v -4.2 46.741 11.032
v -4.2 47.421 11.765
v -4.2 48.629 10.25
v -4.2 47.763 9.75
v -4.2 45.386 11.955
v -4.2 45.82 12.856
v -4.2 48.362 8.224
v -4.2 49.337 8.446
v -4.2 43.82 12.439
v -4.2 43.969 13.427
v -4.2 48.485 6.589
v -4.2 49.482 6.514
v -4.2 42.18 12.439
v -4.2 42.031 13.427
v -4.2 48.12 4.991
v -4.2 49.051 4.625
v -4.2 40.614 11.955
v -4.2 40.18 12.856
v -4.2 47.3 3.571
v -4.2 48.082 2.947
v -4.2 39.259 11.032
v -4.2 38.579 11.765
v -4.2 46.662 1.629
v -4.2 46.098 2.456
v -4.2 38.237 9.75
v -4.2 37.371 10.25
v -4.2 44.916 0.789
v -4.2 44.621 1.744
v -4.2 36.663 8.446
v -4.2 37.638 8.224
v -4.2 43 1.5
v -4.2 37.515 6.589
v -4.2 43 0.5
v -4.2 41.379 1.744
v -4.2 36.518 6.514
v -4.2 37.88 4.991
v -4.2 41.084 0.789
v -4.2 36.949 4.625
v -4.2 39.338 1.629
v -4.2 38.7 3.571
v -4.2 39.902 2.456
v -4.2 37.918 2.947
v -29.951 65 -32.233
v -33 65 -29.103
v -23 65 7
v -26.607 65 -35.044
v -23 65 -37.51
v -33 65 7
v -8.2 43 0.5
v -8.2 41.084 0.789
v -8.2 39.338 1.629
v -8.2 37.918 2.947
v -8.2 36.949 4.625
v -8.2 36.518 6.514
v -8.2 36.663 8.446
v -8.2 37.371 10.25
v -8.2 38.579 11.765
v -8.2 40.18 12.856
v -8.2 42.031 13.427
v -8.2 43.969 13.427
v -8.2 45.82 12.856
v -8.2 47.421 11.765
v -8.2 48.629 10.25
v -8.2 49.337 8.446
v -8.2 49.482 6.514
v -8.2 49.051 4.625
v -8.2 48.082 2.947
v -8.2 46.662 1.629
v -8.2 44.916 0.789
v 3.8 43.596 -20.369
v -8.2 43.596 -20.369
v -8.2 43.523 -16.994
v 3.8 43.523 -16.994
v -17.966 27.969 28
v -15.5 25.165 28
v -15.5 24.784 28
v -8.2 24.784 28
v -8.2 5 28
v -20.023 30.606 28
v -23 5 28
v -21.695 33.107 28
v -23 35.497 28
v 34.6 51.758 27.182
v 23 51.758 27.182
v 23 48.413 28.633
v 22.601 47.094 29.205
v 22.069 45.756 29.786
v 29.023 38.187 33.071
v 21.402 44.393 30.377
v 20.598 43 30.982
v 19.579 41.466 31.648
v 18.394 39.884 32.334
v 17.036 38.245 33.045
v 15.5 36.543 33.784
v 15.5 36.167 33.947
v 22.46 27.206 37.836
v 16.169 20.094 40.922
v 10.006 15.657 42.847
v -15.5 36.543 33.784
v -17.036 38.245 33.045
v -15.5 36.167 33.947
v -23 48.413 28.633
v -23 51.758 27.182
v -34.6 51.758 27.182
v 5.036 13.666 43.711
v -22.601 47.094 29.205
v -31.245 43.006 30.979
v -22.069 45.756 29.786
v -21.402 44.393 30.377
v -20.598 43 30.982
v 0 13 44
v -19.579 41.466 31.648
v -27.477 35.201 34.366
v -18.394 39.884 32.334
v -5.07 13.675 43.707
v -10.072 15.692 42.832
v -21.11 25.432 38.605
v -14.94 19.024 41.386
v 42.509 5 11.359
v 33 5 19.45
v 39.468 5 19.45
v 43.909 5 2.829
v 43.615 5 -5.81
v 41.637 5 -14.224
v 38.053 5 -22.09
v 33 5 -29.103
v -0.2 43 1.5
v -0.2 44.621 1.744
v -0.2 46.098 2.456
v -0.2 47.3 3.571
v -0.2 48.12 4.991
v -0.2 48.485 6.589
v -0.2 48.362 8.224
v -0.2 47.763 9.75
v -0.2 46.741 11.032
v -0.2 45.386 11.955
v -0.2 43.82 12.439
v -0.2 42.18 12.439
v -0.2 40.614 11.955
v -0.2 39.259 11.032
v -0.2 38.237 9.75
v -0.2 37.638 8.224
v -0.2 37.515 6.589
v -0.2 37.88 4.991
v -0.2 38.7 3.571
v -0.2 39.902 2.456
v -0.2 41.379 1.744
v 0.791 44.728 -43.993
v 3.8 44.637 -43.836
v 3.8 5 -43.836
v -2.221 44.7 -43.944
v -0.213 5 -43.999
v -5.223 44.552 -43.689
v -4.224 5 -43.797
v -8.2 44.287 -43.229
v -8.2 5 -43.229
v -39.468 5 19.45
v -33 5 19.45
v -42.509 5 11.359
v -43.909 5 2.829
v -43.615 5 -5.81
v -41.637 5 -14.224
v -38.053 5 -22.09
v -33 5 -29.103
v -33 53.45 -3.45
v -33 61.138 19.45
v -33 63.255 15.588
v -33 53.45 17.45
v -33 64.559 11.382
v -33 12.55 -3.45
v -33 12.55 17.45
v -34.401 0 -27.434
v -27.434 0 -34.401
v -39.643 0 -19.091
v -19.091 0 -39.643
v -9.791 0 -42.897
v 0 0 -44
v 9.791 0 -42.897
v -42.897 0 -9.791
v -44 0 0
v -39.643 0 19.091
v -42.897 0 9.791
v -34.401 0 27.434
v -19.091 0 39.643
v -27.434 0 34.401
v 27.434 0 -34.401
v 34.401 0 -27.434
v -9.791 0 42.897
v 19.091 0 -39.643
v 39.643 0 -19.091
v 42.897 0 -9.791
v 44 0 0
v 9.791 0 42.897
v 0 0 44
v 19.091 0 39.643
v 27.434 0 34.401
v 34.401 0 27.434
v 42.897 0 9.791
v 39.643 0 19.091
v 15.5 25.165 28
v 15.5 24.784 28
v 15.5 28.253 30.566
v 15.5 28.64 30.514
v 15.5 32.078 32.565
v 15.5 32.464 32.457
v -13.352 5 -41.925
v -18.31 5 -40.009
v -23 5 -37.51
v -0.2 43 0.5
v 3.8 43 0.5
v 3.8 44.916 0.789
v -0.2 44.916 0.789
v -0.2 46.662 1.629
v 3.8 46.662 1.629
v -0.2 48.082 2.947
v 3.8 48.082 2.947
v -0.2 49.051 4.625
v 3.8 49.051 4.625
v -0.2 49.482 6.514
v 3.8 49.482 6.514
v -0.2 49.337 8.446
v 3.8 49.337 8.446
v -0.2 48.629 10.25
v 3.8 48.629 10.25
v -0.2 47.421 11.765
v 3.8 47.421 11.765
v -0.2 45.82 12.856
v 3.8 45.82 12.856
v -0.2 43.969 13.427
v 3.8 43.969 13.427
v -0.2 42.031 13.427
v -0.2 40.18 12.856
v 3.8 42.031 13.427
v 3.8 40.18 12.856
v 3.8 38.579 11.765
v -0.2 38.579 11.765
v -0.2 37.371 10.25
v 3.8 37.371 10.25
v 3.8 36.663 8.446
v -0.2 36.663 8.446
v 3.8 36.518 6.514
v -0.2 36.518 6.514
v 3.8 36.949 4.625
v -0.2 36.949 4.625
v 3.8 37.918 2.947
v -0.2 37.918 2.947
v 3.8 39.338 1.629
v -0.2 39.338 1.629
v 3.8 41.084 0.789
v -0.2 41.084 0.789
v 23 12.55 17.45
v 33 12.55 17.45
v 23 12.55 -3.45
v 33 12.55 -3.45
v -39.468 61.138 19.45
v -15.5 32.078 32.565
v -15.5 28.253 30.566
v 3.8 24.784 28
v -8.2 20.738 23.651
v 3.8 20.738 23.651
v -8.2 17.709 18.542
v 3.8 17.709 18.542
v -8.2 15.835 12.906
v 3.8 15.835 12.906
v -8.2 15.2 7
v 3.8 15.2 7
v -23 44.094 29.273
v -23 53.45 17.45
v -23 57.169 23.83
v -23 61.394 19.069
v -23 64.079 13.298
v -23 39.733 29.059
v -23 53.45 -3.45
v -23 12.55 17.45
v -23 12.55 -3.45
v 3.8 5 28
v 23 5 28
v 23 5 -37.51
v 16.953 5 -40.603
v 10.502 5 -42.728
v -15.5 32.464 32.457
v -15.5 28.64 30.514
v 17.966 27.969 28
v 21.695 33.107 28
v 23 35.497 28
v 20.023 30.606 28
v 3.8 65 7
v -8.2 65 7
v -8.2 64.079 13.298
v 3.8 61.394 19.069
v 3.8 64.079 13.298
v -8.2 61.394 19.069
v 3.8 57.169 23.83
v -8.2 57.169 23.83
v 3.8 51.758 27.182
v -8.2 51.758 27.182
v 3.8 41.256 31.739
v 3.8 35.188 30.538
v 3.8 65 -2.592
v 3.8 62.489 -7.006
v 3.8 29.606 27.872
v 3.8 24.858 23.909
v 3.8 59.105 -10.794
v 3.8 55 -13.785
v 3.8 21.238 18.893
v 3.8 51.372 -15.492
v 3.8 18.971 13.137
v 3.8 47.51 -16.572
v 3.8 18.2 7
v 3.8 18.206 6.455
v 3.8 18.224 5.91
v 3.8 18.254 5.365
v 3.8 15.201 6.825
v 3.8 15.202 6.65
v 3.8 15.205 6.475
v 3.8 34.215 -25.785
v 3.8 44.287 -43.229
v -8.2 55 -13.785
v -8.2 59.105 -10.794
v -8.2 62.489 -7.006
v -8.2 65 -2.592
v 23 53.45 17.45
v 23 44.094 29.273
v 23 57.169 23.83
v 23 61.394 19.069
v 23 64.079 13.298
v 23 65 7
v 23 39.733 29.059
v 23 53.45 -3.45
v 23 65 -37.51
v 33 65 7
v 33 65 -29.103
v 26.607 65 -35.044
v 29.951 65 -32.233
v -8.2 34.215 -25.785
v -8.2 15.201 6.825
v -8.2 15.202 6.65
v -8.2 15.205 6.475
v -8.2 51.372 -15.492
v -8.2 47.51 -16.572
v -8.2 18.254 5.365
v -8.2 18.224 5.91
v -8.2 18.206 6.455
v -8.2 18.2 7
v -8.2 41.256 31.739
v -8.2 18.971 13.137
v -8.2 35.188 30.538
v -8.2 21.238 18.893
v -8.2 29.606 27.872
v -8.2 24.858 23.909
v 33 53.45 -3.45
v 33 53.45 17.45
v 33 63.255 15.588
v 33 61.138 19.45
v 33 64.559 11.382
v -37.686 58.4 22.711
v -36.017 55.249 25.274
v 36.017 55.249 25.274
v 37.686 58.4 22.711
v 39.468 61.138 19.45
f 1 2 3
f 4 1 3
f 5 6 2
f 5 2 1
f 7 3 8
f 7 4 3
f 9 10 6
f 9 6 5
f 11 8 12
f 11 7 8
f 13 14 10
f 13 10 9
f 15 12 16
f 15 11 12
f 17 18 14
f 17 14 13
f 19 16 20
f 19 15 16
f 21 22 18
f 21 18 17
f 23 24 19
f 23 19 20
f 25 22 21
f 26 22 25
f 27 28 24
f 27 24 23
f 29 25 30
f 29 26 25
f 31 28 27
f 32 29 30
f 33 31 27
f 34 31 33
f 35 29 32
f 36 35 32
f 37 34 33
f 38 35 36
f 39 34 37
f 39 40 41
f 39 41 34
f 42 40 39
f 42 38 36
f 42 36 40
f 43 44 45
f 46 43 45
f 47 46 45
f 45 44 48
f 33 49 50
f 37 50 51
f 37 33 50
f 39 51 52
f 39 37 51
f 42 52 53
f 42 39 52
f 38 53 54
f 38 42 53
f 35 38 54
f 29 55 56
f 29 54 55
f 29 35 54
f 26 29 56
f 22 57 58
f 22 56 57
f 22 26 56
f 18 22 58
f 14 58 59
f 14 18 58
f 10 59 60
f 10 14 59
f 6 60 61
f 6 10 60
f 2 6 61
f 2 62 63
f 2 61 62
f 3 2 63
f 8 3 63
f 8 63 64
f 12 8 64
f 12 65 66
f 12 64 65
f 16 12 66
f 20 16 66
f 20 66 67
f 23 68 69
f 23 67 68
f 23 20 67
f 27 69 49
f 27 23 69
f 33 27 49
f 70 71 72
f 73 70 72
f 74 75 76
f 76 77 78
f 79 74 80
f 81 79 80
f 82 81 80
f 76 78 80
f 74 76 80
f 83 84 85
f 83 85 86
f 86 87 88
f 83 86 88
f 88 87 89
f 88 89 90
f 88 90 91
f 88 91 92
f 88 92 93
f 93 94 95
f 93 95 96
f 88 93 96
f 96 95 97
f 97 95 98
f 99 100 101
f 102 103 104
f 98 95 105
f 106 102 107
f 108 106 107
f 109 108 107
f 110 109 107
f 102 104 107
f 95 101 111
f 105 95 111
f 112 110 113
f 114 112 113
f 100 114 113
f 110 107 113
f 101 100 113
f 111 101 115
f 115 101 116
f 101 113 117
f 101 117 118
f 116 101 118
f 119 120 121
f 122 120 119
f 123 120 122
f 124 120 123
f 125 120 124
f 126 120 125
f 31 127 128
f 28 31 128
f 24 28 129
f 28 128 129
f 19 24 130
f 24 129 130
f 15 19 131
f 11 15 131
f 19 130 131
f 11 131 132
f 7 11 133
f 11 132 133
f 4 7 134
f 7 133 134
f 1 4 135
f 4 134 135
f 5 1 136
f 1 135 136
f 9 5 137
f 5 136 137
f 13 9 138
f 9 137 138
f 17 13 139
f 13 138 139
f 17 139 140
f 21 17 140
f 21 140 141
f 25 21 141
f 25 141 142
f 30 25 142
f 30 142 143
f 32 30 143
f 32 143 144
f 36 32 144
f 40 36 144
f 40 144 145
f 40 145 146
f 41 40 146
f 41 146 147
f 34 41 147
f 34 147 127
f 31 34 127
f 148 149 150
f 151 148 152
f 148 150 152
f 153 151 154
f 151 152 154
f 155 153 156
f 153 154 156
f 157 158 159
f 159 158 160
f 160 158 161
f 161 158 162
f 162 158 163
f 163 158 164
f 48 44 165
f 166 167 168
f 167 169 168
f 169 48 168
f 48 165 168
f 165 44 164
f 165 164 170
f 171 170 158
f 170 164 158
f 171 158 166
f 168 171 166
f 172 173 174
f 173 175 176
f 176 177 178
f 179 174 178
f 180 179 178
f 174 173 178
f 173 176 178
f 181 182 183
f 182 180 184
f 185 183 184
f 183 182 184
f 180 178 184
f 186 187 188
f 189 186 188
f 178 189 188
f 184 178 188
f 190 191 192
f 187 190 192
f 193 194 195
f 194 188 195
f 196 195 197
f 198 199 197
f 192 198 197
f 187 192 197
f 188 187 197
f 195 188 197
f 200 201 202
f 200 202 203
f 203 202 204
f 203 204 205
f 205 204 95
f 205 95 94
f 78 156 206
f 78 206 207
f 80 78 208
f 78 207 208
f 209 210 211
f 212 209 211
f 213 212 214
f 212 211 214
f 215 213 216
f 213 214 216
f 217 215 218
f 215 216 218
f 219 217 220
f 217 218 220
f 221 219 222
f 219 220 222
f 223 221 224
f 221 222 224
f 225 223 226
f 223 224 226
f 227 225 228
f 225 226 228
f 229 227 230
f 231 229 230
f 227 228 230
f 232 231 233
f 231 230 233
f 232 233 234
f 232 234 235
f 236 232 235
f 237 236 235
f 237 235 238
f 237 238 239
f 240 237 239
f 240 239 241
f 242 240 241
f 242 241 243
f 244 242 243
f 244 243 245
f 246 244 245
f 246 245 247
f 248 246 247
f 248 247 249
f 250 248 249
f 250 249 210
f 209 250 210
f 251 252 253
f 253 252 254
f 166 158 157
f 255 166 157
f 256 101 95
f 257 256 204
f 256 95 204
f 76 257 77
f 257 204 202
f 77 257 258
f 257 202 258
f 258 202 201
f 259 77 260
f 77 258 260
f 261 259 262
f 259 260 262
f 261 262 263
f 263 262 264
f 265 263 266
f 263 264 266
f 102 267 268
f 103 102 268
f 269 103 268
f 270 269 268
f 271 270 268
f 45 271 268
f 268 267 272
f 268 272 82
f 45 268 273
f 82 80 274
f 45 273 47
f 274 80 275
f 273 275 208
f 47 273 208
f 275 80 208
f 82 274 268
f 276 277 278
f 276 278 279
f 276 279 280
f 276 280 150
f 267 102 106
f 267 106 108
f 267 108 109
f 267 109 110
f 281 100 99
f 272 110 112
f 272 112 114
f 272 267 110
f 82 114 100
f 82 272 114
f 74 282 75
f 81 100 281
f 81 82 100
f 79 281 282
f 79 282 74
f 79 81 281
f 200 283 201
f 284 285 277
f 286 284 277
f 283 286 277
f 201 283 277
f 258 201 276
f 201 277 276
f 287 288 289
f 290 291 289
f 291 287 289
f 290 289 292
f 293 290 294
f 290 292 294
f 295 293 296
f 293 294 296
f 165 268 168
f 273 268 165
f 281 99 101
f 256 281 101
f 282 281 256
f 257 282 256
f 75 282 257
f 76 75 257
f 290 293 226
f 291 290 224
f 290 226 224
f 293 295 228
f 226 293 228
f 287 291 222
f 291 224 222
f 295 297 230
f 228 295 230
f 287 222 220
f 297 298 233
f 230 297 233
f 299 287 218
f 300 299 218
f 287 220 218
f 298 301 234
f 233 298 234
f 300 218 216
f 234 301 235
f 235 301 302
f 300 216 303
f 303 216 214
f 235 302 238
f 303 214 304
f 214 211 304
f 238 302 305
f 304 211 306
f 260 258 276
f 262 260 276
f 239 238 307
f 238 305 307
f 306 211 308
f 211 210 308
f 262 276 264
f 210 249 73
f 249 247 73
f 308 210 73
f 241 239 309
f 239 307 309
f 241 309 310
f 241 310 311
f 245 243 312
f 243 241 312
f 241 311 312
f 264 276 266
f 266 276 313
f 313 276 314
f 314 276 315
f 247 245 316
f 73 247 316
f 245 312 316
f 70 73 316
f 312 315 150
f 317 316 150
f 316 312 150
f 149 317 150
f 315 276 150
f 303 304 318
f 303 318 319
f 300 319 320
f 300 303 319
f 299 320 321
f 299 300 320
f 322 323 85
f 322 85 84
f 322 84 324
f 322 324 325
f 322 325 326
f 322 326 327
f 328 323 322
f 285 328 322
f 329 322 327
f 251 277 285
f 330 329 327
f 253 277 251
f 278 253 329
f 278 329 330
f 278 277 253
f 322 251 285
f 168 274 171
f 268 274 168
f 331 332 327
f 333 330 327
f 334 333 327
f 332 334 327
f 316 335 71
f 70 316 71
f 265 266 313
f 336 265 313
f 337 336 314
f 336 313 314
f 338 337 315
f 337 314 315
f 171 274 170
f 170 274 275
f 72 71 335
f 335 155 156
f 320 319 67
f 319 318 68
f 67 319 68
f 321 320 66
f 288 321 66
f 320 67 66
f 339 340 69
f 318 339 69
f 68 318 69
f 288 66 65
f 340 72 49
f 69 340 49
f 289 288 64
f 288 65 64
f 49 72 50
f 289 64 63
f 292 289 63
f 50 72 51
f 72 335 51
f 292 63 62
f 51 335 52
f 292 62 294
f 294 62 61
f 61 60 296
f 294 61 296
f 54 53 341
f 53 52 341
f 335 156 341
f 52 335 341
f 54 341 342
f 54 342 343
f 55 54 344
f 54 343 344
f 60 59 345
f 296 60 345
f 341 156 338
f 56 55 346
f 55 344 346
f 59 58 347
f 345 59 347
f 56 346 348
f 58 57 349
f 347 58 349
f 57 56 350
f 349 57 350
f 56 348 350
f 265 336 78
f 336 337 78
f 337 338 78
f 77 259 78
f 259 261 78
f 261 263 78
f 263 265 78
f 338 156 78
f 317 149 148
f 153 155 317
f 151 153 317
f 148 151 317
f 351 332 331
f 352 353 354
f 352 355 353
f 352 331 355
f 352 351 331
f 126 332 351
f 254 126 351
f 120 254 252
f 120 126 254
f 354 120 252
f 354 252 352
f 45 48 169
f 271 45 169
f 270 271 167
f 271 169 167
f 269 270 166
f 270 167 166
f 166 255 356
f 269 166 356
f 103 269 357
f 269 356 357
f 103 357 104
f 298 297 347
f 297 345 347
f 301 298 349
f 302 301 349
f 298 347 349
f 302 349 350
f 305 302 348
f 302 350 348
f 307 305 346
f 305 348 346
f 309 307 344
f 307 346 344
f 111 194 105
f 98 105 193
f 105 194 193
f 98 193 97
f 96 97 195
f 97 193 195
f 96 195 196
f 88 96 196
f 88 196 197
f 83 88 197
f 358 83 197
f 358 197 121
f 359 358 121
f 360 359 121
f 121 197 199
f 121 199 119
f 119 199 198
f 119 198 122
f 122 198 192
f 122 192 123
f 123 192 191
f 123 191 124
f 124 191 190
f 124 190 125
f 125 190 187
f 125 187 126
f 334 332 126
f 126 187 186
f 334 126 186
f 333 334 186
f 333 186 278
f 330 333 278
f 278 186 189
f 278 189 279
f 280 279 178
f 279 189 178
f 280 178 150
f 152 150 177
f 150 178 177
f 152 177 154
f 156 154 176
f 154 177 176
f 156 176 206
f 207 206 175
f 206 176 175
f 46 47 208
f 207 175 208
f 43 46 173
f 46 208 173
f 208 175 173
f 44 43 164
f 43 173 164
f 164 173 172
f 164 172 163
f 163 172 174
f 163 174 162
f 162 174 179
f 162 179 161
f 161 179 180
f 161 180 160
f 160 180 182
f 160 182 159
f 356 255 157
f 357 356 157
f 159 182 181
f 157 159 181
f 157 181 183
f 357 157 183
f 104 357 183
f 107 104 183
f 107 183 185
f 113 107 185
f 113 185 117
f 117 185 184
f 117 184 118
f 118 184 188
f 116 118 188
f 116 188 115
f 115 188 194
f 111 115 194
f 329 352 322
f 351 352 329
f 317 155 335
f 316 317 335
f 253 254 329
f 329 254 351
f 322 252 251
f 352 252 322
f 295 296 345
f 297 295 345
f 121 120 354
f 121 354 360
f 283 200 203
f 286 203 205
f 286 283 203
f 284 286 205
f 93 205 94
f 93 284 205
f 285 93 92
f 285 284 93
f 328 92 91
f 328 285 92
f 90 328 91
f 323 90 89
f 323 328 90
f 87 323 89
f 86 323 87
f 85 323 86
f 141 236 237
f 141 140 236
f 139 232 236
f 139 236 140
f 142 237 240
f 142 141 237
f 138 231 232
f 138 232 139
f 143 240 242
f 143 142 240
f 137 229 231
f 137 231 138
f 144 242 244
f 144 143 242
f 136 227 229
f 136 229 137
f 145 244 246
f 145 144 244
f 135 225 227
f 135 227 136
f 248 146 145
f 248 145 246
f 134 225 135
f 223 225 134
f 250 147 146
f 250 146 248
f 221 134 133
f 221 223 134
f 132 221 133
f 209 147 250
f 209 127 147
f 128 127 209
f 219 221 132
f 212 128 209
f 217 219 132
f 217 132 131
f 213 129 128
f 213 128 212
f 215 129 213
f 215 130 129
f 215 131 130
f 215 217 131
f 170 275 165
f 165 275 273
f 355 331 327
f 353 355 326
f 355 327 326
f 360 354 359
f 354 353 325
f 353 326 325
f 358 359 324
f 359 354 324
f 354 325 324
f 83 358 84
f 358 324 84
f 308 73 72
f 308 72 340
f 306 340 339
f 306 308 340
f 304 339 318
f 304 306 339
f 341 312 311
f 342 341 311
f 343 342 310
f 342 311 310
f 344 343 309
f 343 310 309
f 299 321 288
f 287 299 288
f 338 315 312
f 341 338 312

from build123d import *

# Parameters (mm, degrees)
SKETCH_1_R                = 44
EXTRUDE_1_DEPTH           = 80
CUT_EXTRUDE_START         = 5
SKETCH_2_W                = 23
SKETCH_2_H                = 72
CUT_EXTRUDE_5_DEPTH       = 97.350875675
SKETCH_3_W                = 20.9
SKETCH_3_H                = 40.9
CUT_EXTRUDE_6_DEPTH       = 120.436175424
EXTRUDE_2_DEPTH           = 75
SKETCH_7_R                = 6.5
CUT_EXTRUDE_7_DEPTH       = 4
CUT_EXTRUDE_START_2       = -4
SKETCH_8_R                = 6.5
CUT_EXTRUDE_8_DEPTH       = 4
CUT_EXTRUDE_9_REACH       = 105.057
SKETCH_9_R                = 5.5
CUT_EXTRUDE_10_DEPTH      = 120.436175424
CUT_EXTRUDE_10_DEPTH_BACK = 120.436175424
CUT_EXTRUDE_START_3       = -12
CUT_EXTRUDE_13_DEPTH      = 12
CUT_EXTRUDE_14_REACH      = 96.265
CUT_REVOLVE_1_ANGLE       = 180
CUT_REVOLVE_2_ANGLE       = 180
CUT_EXTRUDE_20_REACH      = 93.901


with BuildPart() as part:
    # 草图1 → 凸台-拉伸1 (new body)
    with BuildSketch(Plane(origin=(0, 0, 0), x_dir=(1, 0, 0), z_dir=(0, 1, 0))):
        with Locations(Location((0, 0, 0), (0, 0, 270))):
            Circle(SKETCH_1_R)
    extrude(amount=EXTRUDE_1_DEPTH)

    # 草图2 → 切除-拉伸5 (cut, through all)
    with BuildSketch(Plane(origin=(0, 0, 0), x_dir=(1, 0, 0), z_dir=(0, 1, 0)).offset(CUT_EXTRUDE_START)):
        with BuildLine():
            Line((33, 29.103264422), (33, -19.45))
            Line((33, -19.45), (39.467676648, -19.45))
            ThreePointArc((39.467676648, -19.45), (43.614744195, 5.809826917), (33, 29.103264422))
        make_face()
        with Locations((11.5, 8)):
            Rectangle(SKETCH_2_W, SKETCH_2_H)
    cut_extrude_5 = extrude(amount=CUT_EXTRUDE_5_DEPTH, mode=Mode.SUBTRACT)

    # 镜向1: 切除-拉伸5 across plane
    add(cut_extrude_5.mirror(Plane(origin=(0, 0, 0), x_dir=(0, 0, 1), z_dir=(1, 0, 0))), mode=Mode.SUBTRACT)

    # 草图3 → 切除-拉伸6 (cut, through all)
    with BuildSketch(Plane(origin=(33, 0, 0), x_dir=(0, 0, -1), z_dir=(1, 0, 0))):
        with Locations((-7, 33)):
            Rectangle(SKETCH_3_W, SKETCH_3_H)
    extrude(amount=-CUT_EXTRUDE_6_DEPTH, mode=Mode.SUBTRACT)

    # 草图6 → 凸台-拉伸2 (add)
    with BuildSketch(Plane(origin=(0, 5, 0), x_dir=(1, 0, 0), z_dir=(0, 1, 0))):
        with BuildLine():
            Line((-8.2, 43.229156827), (-8.2, -28))
            Line((-8.2, -28), (3.8, -28))
            Line((3.8, -28), (3.8, 43.835601969))
            ThreePointArc((3.8, 43.835601969), (-2.220798038, 43.943919444), (-8.2, 43.229156827))
        make_face()
    extrude(amount=EXTRUDE_2_DEPTH)

    # 草图7 → 切除-拉伸7 (cut)
    with BuildSketch(Plane(origin=(3.8, 0, 0), x_dir=(0, 0, -1), z_dir=(1, 0, 0))):
        with Locations((-7, 43)):
            Circle(SKETCH_7_R)
    extrude(amount=-CUT_EXTRUDE_7_DEPTH, mode=Mode.SUBTRACT)

    # 草图8 → 切除-拉伸8 (cut)
    with BuildSketch(Plane.ZY.offset(8.2).offset(CUT_EXTRUDE_START_2)):
        with Locations(Location((7, 43, 0), (0, 0, 180))):
            Circle(SKETCH_8_R)
    extrude(amount=CUT_EXTRUDE_8_DEPTH, mode=Mode.SUBTRACT)

    # 草图9 → 切除-拉伸9 (cut, up to next)
    with BuildSketch(Plane(origin=(3.8, 0, 0), x_dir=(0, 0, -1), z_dir=(1, 0, 0)), mode=Mode.PRIVATE) as cut_extrude_9_sk1:
        with Locations((-7, 43)):
            Circle(SKETCH_9_R)
    cut_extrude_9_tool1 = extrude(cut_extrude_9_sk1.sketch, amount=-CUT_EXTRUDE_9_REACH, mode=Mode.PRIVATE) & part.part
    add(cut_extrude_9_tool1.solids().sort_by_distance((3.8, 43, 7))[0], mode=Mode.SUBTRACT)

    # 草图10 → 切除-拉伸10 (cut, two sides: drawn at the far end of the back side and taken through both)
    with BuildSketch(Plane(origin=(33, 0, 0), x_dir=(0, 0, -1), z_dir=(1, 0, 0)).offset(-CUT_EXTRUDE_10_DEPTH_BACK)):
        with BuildLine():
            Line((44, 80), (44, 65))
            Line((44, 65), (-7, 65))
            ThreePointArc((-7, 65), (-19.069252989, 61.393834083), (-27.181803363, 51.757557481))
            Line((-27.181803363, 51.757557481), (-44, 13))
            Line((-44, 13), (-44, 80))
            Line((-44, 80), (44, 80))
        make_face()
    extrude(amount=CUT_EXTRUDE_10_DEPTH + CUT_EXTRUDE_10_DEPTH_BACK, mode=Mode.SUBTRACT)

    # 草图18 → 切除-拉伸13 (cut)
    with BuildSketch(Plane.ZY.offset(8.2).offset(CUT_EXTRUDE_START_3)):
        with BuildLine():
            ThreePointArc((-16.994306564, 43.522735592), (-16.113193955, 49.463765557), (-13.784609691, 55))
            ThreePointArc((-13.784609691, 55), (-8.989980812, 60.897500207), (-2.591663047, 65))
            Line((-2.591663047, 65), (-21.495613698, 65))
            ThreePointArc((-21.495613698, 65), (-26.943692062, 54.992738185), (-28.991459846, 43.784103388))
            Line((-28.991459846, 43.784103388), (-16.994306564, 43.522735592))
        make_face()
    extrude(amount=CUT_EXTRUDE_13_DEPTH, mode=Mode.SUBTRACT)

    # 草图19 → 切除-拉伸14 (cut, up to next)
    with BuildSketch(Plane.ZY.offset(8.2), mode=Mode.PRIVATE) as cut_extrude_14_sk1:
        with BuildLine():
            Line((-25.784609691, 34.215390309), (-20.368569743, 43.596246675))
            Line((-20.368569743, 43.596246675), (-28.991459846, 43.784103388))
            ThreePointArc((-28.991459846, 43.784103388), (-26.943692062, 54.992738185), (-21.495613698, 65))
            Line((-21.495613698, 65), (-43.229156827, 65))
            Line((-43.229156827, 65), (-43.229156827, 44.287004294))
            Line((-43.229156827, 44.287004294), (-25.784609691, 34.215390309))
        make_face()
    cut_extrude_14_tool1 = extrude(cut_extrude_14_sk1.sketch, amount=-CUT_EXTRUDE_14_REACH, mode=Mode.PRIVATE) & part.part
    # 草图19 → 切除-拉伸14 (cut, up to next)
    with BuildSketch(Plane.ZY.offset(8.2), mode=Mode.PRIVATE) as cut_extrude_14_sk2:
        with BuildLine():
            Line((-20.368569743, 43.596246675), (-13.784609691, 55))
            Line((-13.784609691, 55), (-13.784609691, 93.841822502))
            Line((-13.784609691, 93.841822502), (-75.156898342, 93.841822502))
            Line((-75.156898342, 93.841822502), (-75.156898342, 62.720494453))
            Line((-75.156898342, 62.720494453), (-43.229156827, 44.287004294))
            Line((-43.229156827, 44.287004294), (-43.229156827, 65))
            Line((-43.229156827, 65), (-21.495613698, 65))
            ThreePointArc((-21.495613698, 65), (-26.943692062, 54.992738185), (-28.991459846, 43.784103388))
            Line((-28.991459846, 43.784103388), (-20.368569743, 43.596246675))
        make_face()
    cut_extrude_14_tool2 = extrude(cut_extrude_14_sk2.sketch, amount=-CUT_EXTRUDE_14_REACH, mode=Mode.PRIVATE) & part.part
    add(cut_extrude_14_tool1.solids().sort_by_distance((-8.2, 51.836761, -33.537679))[0], mode=Mode.SUBTRACT)
    add(cut_extrude_14_tool2.solids().sort_by_distance((-8.2, 73.617285, -43.768646))[0], mode=Mode.SUBTRACT)

    # 草图24 → 切除-旋转1 (revolve, symmetric, cut)
    with BuildSketch(Plane(origin=(0, 43, 0), x_dir=(-1, 0, 0), z_dir=(0, -1, 0))) as cut_revolve_1_sk:
        Polygon((15.5, -31.8), (15.5, -34.8), (-15.5, -34.8), (-15.5, -31.8), (-15.5, -7), (-3.8, -7), (-3.8, -31.8), (8.2, -31.8), (8.2, -7), (15.5, -7), align=None)
    revolve(axis=Axis((-101.499852898, 43, 7), (1, 0, 0)), revolution_arc=CUT_REVOLVE_1_ANGLE / 2, mode=Mode.SUBTRACT)
    revolve(cut_revolve_1_sk.sketch, axis=Axis((-101.499852898, 43, 7), (-1, 0, 0)), revolution_arc=CUT_REVOLVE_1_ANGLE / 2, mode=Mode.SUBTRACT)

    # 草图26 → 切除-旋转2 (revolve, symmetric, cut)
    with BuildSketch(Plane(origin=(0, 43, 0), x_dir=(1, 0, 0), z_dir=(0, 1, 0))) as cut_revolve_2_sk:
        Polygon((-15.5, -34.551556537), (-23, -29.3), (-23, -28), (-15.5, -28), align=None)
        Polygon((15.5, -34.551556537), (23, -29.3), (23, -28), (15.5, -28), align=None)
    revolve(axis=Axis((-28, 43, 7), (1, 0, 0)), revolution_arc=CUT_REVOLVE_2_ANGLE / 2, mode=Mode.SUBTRACT)
    revolve(cut_revolve_2_sk.sketch, axis=Axis((-28, 43, 7), (-1, 0, 0)), revolution_arc=CUT_REVOLVE_2_ANGLE / 2, mode=Mode.SUBTRACT)

    # 草图28 → 切除-拉伸20 (cut, up to next)
    with BuildSketch(Plane(origin=(3.8, 0, 0), x_dir=(0, 0, -1), z_dir=(1, 0, 0)), mode=Mode.PRIVATE) as cut_extrude_20_sk1:
        with BuildLine():
            ThreePointArc((-7, 15.2), (-6.737382717, 15.201240456), (-6.474788871, 15.204961715))
            Line((-6.474788871, 15.204961715), (-5.365047446, 18.253951222))
            ThreePointArc((-5.365047446, 18.253951222), (-6.182078765, 18.213491475), (-7, 18.2))
            Line((-7, 18.2), (-7, 15.2))
        make_face()
    cut_extrude_20_tool1 = extrude(cut_extrude_20_sk1.sketch, amount=-CUT_EXTRUDE_20_REACH, mode=Mode.PRIVATE) & part.part
    add(cut_extrude_20_tool1.solids().sort_by_distance((3.8, 16.966985, 6.413126))[0], mode=Mode.SUBTRACT)


solid = part.part
